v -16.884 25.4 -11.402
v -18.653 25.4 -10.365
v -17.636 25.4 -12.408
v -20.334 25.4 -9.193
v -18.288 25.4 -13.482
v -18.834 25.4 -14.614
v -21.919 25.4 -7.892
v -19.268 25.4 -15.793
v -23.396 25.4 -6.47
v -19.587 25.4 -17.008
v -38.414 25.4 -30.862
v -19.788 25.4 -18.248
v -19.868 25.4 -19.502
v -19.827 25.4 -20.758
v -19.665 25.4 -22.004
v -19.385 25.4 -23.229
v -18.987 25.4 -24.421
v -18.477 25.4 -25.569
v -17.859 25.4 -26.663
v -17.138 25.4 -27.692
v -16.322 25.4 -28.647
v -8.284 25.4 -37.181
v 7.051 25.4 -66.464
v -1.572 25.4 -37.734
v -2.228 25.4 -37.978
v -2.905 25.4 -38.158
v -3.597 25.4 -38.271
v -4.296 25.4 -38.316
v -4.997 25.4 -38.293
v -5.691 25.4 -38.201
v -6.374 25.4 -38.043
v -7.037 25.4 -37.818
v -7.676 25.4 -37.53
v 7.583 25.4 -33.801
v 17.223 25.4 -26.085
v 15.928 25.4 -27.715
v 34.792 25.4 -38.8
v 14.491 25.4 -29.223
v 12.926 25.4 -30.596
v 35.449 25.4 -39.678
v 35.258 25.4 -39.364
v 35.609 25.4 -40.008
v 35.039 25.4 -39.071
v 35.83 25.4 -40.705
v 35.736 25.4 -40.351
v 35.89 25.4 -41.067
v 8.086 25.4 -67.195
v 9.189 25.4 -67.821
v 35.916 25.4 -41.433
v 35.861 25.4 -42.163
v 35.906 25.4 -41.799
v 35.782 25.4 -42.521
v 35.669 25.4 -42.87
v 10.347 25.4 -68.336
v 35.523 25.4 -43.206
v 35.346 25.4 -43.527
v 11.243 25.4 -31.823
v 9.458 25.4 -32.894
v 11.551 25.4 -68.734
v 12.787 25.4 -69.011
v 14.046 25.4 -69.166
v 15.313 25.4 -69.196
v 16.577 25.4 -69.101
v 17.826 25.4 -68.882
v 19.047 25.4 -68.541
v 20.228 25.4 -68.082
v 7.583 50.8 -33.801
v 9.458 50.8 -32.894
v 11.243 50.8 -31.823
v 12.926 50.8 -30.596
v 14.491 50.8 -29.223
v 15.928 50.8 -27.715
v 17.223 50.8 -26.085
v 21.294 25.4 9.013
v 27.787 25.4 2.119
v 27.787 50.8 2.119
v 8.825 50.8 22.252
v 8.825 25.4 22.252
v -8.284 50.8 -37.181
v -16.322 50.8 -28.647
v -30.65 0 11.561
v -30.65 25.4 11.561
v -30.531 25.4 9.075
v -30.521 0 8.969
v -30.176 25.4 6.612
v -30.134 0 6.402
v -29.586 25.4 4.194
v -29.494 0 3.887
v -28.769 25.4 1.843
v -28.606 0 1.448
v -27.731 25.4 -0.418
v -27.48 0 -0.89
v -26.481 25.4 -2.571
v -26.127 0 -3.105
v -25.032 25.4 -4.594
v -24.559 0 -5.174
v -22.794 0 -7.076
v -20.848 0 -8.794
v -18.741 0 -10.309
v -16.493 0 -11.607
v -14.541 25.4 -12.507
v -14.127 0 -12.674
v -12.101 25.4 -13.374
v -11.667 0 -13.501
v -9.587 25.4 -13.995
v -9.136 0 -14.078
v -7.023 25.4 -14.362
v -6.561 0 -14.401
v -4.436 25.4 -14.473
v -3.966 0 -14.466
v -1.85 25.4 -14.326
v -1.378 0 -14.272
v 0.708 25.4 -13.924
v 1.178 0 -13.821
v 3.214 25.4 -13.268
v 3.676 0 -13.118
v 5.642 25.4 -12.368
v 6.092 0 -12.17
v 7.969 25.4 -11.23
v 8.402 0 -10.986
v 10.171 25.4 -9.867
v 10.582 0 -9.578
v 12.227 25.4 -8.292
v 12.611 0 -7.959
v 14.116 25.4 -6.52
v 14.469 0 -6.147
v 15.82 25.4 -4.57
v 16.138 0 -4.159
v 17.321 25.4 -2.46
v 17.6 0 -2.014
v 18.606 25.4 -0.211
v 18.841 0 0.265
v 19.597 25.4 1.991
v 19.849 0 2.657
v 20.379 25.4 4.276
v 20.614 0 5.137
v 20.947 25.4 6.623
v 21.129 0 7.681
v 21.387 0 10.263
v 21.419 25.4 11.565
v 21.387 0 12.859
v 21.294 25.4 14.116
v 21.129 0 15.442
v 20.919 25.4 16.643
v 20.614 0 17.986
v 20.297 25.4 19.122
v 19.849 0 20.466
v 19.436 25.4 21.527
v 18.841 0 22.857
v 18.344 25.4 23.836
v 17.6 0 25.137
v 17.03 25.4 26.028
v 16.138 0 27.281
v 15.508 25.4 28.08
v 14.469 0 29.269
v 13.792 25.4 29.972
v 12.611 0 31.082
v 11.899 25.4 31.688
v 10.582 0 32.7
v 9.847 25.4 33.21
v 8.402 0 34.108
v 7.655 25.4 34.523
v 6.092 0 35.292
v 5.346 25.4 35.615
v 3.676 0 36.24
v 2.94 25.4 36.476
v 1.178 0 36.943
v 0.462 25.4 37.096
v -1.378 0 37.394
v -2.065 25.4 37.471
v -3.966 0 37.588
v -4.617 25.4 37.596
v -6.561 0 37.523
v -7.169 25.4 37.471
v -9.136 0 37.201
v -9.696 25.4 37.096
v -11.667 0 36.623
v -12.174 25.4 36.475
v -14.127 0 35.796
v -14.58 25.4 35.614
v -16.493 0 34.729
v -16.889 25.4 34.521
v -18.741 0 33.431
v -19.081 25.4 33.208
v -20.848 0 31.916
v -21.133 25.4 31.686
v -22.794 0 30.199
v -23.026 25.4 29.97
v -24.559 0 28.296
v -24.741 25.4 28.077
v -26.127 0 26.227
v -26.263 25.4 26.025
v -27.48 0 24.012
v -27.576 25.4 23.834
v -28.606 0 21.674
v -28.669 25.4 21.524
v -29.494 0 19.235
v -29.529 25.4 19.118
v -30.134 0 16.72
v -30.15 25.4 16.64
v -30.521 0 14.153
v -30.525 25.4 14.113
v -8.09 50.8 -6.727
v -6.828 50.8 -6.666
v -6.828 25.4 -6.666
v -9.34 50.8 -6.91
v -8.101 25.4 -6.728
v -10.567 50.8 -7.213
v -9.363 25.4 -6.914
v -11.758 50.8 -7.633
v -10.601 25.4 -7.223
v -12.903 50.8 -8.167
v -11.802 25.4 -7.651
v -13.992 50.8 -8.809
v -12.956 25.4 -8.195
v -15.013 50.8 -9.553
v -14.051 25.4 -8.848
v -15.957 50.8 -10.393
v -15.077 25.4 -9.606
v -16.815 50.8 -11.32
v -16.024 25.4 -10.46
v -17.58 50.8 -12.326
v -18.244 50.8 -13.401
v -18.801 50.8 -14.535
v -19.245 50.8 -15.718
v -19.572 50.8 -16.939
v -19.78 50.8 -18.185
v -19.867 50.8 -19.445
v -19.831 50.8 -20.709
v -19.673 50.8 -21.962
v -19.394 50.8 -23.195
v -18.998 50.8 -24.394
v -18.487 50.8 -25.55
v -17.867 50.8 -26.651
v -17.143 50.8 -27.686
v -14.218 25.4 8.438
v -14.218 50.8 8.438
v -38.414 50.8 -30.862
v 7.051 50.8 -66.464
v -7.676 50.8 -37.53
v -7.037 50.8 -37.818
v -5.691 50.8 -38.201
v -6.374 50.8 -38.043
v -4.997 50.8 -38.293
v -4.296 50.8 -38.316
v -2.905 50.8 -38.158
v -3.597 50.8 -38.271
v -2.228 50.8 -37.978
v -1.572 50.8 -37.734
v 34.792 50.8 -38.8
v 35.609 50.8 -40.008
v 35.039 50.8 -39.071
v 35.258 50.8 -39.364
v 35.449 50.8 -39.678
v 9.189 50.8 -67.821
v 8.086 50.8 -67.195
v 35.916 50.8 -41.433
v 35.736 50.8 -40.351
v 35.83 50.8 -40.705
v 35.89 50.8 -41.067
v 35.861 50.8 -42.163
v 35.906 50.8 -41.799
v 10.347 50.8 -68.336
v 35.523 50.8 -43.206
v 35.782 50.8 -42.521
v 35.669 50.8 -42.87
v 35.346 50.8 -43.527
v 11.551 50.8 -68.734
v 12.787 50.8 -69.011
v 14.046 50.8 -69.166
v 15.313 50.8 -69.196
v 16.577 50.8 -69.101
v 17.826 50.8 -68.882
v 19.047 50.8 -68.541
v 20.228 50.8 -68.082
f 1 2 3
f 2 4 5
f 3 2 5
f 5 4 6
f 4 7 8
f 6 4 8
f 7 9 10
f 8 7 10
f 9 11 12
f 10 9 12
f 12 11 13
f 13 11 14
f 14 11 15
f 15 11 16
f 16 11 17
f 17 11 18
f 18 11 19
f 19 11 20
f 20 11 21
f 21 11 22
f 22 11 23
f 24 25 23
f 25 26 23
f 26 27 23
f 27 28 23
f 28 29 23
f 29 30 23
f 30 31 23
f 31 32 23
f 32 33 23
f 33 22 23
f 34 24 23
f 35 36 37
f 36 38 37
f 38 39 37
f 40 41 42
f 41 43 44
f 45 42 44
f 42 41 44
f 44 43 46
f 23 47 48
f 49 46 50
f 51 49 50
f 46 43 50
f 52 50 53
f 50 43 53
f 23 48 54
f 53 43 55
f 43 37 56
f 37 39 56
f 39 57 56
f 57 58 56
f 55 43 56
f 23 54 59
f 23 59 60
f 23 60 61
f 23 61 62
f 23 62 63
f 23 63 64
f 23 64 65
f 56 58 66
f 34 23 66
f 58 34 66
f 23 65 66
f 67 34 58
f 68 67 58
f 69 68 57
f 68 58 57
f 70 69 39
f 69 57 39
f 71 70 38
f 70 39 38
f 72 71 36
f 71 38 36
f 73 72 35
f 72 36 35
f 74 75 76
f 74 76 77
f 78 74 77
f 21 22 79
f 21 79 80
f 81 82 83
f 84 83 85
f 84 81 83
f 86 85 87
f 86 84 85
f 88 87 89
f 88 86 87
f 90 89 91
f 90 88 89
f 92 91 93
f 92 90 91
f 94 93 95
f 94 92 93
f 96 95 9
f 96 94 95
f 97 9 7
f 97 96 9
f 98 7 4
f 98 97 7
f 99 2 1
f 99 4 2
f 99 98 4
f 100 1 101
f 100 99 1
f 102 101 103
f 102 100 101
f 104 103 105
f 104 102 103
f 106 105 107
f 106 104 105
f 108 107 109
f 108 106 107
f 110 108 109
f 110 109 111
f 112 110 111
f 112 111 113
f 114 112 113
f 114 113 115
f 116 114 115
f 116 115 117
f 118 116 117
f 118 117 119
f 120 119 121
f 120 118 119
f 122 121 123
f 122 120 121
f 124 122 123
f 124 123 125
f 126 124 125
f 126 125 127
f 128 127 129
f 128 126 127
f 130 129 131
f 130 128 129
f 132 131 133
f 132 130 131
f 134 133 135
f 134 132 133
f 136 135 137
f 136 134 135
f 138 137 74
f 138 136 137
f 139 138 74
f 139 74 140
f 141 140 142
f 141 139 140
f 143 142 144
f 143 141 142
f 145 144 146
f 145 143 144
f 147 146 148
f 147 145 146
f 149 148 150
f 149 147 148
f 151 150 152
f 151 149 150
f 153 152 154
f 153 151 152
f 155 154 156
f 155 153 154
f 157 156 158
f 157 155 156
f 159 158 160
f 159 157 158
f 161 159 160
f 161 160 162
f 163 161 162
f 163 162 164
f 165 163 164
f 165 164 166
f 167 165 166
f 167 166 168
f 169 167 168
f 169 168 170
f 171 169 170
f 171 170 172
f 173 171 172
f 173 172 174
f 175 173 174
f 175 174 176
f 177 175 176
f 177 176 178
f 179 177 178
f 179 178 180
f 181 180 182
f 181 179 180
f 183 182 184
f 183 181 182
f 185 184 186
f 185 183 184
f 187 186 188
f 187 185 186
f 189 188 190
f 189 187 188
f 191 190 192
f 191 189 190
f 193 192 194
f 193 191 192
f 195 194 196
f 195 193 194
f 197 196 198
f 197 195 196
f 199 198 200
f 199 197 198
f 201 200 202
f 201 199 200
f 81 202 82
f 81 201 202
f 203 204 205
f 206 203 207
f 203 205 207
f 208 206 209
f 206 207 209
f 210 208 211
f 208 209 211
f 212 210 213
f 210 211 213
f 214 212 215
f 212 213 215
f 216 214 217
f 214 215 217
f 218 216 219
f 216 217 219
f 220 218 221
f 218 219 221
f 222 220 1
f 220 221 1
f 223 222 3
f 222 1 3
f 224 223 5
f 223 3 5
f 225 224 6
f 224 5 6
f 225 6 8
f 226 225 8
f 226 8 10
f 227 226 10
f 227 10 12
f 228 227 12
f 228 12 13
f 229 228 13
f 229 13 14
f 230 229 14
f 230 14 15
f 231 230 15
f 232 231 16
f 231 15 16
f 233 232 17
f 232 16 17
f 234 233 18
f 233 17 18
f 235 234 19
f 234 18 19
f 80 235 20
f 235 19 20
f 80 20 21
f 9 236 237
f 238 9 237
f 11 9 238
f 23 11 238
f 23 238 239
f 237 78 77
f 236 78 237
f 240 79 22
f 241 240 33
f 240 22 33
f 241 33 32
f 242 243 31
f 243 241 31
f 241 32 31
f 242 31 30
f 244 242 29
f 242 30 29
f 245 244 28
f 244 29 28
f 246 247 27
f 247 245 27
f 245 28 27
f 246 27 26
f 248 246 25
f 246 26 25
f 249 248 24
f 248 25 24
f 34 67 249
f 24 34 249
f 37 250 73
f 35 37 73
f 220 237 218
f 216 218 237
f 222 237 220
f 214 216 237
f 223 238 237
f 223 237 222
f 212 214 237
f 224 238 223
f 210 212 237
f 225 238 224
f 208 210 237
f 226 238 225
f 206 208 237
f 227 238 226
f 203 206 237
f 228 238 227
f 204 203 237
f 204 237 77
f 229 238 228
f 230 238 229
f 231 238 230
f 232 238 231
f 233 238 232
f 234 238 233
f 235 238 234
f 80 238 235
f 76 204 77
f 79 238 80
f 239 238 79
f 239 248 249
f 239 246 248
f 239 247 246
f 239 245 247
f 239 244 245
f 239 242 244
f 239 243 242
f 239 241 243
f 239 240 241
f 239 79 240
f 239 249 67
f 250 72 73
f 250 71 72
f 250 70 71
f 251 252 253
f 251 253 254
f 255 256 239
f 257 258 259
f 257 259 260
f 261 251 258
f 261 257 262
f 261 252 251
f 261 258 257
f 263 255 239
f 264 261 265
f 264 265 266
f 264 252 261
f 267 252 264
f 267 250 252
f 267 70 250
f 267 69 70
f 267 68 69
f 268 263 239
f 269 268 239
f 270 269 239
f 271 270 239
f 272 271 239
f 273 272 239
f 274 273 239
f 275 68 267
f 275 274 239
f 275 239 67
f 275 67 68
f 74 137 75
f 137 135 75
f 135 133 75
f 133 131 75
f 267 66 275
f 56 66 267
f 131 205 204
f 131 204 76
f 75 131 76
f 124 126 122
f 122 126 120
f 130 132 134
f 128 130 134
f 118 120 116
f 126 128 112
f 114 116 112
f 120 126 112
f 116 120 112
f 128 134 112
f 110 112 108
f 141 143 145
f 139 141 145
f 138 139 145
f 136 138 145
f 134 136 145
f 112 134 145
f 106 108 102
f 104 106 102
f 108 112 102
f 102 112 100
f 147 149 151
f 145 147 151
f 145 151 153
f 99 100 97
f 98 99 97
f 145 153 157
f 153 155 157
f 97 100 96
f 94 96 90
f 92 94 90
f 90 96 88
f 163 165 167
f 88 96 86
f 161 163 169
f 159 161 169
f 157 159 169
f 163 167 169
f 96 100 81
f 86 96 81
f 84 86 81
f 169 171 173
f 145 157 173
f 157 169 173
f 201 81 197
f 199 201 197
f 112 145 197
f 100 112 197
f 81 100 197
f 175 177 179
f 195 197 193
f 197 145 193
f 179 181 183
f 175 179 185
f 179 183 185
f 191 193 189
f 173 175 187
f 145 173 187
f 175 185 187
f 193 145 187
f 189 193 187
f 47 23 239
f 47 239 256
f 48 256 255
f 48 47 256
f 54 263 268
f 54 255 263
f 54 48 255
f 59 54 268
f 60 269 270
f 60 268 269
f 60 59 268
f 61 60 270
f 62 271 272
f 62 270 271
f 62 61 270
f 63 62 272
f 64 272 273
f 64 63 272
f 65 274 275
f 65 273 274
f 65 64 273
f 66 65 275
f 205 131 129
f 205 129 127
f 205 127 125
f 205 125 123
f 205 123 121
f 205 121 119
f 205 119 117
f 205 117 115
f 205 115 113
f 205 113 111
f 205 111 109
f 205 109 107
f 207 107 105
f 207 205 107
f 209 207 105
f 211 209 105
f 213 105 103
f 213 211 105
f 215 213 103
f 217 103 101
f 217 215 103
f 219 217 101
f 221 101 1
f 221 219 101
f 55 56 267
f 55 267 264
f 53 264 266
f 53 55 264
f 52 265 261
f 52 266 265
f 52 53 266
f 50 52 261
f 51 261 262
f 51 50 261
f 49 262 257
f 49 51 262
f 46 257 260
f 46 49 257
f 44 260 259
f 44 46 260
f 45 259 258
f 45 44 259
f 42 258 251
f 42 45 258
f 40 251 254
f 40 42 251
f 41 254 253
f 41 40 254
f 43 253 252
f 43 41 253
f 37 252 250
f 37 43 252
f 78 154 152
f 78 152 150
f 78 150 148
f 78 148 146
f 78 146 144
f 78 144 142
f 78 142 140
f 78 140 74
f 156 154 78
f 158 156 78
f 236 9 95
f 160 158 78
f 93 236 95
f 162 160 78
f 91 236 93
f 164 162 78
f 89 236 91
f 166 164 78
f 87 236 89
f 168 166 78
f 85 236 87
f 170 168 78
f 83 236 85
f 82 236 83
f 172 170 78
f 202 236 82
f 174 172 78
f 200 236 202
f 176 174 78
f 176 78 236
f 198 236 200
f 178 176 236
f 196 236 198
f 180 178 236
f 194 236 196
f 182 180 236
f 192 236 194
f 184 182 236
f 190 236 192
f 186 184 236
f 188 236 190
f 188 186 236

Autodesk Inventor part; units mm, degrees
ref_plane "YZ Plane" through (0, 0, 0) normal (1, 0, 0) x (0, 1, 0)
ref_plane "XZ Plane" through (0, 0, 0) normal (0, 1, 0) x (-1, 0, 0)
ref_plane "XY Plane" through (0, 0, 0) normal (0, 0, 1) x (1, 0, 0)
sketch "Sketch1" plane through (0, 0, 0) normal (0, 1, 0) x (-1, 0, 0)
  circle A0 centre (4.6155, 11.5612) radius 26.0349
  point P0 (0, 0)
extrude "Extrusion1" add sketch "Sketch1" along normal blind 25.4
sketch "Sketch2" plane through (-4.6155, 25.4, 11.5612) normal (0, 1, 0) x (1, 0, 0)
  line L0 (-9.602, 3.1232) -> (-33.7988, 42.4236)
  line L1 (-33.7988, 42.4236) -> (11.6664, 78.0251)
  arc A0 (24.8436, 79.6434) -> (11.6664, 78.0251) centre (19.5984, 67.8956) ccw
  line L2 (24.8436, 79.6434) -> (39.9619, 55.0882)
  arc A1 (39.4079, 50.3607) -> (39.9619, 55.0882) centre (36.6923, 53.0751) ccw
  line L3 (39.4079, 50.3607) -> (21.8383, 37.6459)
  arc A2 (21.8383, 37.6459) -> (12.1988, 45.3621) centre (3.0409, 24.0425) ccw
  line L4 (12.1988, 45.3621) -> (3.0438, 49.2947)
  arc A3 (3.0438, 49.2947) -> (-3.6684, 48.7425) centre (0.208, 42.6931) ccw
  line L5 (-3.6684, 48.7425) -> (-11.7064, 40.2083)
  arc A4 (-11.7064, 40.2083) -> (-2.2121, 18.2269) centre (-2.2136, 31.2674) ccw
  line L6 (-2.2121, 18.2269) -> (32.4028, 9.4421)
  line L7 (32.4028, 9.4421) -> (13.4408, -10.6903)
  line L8 (13.4408, -10.6903) -> (-9.602, 3.1232)
  point P0 (4.6155, 11.5612)
extrude "Extrusion2" add sketch "Sketch2" along normal blind 25.4
properties part number "Test part"
